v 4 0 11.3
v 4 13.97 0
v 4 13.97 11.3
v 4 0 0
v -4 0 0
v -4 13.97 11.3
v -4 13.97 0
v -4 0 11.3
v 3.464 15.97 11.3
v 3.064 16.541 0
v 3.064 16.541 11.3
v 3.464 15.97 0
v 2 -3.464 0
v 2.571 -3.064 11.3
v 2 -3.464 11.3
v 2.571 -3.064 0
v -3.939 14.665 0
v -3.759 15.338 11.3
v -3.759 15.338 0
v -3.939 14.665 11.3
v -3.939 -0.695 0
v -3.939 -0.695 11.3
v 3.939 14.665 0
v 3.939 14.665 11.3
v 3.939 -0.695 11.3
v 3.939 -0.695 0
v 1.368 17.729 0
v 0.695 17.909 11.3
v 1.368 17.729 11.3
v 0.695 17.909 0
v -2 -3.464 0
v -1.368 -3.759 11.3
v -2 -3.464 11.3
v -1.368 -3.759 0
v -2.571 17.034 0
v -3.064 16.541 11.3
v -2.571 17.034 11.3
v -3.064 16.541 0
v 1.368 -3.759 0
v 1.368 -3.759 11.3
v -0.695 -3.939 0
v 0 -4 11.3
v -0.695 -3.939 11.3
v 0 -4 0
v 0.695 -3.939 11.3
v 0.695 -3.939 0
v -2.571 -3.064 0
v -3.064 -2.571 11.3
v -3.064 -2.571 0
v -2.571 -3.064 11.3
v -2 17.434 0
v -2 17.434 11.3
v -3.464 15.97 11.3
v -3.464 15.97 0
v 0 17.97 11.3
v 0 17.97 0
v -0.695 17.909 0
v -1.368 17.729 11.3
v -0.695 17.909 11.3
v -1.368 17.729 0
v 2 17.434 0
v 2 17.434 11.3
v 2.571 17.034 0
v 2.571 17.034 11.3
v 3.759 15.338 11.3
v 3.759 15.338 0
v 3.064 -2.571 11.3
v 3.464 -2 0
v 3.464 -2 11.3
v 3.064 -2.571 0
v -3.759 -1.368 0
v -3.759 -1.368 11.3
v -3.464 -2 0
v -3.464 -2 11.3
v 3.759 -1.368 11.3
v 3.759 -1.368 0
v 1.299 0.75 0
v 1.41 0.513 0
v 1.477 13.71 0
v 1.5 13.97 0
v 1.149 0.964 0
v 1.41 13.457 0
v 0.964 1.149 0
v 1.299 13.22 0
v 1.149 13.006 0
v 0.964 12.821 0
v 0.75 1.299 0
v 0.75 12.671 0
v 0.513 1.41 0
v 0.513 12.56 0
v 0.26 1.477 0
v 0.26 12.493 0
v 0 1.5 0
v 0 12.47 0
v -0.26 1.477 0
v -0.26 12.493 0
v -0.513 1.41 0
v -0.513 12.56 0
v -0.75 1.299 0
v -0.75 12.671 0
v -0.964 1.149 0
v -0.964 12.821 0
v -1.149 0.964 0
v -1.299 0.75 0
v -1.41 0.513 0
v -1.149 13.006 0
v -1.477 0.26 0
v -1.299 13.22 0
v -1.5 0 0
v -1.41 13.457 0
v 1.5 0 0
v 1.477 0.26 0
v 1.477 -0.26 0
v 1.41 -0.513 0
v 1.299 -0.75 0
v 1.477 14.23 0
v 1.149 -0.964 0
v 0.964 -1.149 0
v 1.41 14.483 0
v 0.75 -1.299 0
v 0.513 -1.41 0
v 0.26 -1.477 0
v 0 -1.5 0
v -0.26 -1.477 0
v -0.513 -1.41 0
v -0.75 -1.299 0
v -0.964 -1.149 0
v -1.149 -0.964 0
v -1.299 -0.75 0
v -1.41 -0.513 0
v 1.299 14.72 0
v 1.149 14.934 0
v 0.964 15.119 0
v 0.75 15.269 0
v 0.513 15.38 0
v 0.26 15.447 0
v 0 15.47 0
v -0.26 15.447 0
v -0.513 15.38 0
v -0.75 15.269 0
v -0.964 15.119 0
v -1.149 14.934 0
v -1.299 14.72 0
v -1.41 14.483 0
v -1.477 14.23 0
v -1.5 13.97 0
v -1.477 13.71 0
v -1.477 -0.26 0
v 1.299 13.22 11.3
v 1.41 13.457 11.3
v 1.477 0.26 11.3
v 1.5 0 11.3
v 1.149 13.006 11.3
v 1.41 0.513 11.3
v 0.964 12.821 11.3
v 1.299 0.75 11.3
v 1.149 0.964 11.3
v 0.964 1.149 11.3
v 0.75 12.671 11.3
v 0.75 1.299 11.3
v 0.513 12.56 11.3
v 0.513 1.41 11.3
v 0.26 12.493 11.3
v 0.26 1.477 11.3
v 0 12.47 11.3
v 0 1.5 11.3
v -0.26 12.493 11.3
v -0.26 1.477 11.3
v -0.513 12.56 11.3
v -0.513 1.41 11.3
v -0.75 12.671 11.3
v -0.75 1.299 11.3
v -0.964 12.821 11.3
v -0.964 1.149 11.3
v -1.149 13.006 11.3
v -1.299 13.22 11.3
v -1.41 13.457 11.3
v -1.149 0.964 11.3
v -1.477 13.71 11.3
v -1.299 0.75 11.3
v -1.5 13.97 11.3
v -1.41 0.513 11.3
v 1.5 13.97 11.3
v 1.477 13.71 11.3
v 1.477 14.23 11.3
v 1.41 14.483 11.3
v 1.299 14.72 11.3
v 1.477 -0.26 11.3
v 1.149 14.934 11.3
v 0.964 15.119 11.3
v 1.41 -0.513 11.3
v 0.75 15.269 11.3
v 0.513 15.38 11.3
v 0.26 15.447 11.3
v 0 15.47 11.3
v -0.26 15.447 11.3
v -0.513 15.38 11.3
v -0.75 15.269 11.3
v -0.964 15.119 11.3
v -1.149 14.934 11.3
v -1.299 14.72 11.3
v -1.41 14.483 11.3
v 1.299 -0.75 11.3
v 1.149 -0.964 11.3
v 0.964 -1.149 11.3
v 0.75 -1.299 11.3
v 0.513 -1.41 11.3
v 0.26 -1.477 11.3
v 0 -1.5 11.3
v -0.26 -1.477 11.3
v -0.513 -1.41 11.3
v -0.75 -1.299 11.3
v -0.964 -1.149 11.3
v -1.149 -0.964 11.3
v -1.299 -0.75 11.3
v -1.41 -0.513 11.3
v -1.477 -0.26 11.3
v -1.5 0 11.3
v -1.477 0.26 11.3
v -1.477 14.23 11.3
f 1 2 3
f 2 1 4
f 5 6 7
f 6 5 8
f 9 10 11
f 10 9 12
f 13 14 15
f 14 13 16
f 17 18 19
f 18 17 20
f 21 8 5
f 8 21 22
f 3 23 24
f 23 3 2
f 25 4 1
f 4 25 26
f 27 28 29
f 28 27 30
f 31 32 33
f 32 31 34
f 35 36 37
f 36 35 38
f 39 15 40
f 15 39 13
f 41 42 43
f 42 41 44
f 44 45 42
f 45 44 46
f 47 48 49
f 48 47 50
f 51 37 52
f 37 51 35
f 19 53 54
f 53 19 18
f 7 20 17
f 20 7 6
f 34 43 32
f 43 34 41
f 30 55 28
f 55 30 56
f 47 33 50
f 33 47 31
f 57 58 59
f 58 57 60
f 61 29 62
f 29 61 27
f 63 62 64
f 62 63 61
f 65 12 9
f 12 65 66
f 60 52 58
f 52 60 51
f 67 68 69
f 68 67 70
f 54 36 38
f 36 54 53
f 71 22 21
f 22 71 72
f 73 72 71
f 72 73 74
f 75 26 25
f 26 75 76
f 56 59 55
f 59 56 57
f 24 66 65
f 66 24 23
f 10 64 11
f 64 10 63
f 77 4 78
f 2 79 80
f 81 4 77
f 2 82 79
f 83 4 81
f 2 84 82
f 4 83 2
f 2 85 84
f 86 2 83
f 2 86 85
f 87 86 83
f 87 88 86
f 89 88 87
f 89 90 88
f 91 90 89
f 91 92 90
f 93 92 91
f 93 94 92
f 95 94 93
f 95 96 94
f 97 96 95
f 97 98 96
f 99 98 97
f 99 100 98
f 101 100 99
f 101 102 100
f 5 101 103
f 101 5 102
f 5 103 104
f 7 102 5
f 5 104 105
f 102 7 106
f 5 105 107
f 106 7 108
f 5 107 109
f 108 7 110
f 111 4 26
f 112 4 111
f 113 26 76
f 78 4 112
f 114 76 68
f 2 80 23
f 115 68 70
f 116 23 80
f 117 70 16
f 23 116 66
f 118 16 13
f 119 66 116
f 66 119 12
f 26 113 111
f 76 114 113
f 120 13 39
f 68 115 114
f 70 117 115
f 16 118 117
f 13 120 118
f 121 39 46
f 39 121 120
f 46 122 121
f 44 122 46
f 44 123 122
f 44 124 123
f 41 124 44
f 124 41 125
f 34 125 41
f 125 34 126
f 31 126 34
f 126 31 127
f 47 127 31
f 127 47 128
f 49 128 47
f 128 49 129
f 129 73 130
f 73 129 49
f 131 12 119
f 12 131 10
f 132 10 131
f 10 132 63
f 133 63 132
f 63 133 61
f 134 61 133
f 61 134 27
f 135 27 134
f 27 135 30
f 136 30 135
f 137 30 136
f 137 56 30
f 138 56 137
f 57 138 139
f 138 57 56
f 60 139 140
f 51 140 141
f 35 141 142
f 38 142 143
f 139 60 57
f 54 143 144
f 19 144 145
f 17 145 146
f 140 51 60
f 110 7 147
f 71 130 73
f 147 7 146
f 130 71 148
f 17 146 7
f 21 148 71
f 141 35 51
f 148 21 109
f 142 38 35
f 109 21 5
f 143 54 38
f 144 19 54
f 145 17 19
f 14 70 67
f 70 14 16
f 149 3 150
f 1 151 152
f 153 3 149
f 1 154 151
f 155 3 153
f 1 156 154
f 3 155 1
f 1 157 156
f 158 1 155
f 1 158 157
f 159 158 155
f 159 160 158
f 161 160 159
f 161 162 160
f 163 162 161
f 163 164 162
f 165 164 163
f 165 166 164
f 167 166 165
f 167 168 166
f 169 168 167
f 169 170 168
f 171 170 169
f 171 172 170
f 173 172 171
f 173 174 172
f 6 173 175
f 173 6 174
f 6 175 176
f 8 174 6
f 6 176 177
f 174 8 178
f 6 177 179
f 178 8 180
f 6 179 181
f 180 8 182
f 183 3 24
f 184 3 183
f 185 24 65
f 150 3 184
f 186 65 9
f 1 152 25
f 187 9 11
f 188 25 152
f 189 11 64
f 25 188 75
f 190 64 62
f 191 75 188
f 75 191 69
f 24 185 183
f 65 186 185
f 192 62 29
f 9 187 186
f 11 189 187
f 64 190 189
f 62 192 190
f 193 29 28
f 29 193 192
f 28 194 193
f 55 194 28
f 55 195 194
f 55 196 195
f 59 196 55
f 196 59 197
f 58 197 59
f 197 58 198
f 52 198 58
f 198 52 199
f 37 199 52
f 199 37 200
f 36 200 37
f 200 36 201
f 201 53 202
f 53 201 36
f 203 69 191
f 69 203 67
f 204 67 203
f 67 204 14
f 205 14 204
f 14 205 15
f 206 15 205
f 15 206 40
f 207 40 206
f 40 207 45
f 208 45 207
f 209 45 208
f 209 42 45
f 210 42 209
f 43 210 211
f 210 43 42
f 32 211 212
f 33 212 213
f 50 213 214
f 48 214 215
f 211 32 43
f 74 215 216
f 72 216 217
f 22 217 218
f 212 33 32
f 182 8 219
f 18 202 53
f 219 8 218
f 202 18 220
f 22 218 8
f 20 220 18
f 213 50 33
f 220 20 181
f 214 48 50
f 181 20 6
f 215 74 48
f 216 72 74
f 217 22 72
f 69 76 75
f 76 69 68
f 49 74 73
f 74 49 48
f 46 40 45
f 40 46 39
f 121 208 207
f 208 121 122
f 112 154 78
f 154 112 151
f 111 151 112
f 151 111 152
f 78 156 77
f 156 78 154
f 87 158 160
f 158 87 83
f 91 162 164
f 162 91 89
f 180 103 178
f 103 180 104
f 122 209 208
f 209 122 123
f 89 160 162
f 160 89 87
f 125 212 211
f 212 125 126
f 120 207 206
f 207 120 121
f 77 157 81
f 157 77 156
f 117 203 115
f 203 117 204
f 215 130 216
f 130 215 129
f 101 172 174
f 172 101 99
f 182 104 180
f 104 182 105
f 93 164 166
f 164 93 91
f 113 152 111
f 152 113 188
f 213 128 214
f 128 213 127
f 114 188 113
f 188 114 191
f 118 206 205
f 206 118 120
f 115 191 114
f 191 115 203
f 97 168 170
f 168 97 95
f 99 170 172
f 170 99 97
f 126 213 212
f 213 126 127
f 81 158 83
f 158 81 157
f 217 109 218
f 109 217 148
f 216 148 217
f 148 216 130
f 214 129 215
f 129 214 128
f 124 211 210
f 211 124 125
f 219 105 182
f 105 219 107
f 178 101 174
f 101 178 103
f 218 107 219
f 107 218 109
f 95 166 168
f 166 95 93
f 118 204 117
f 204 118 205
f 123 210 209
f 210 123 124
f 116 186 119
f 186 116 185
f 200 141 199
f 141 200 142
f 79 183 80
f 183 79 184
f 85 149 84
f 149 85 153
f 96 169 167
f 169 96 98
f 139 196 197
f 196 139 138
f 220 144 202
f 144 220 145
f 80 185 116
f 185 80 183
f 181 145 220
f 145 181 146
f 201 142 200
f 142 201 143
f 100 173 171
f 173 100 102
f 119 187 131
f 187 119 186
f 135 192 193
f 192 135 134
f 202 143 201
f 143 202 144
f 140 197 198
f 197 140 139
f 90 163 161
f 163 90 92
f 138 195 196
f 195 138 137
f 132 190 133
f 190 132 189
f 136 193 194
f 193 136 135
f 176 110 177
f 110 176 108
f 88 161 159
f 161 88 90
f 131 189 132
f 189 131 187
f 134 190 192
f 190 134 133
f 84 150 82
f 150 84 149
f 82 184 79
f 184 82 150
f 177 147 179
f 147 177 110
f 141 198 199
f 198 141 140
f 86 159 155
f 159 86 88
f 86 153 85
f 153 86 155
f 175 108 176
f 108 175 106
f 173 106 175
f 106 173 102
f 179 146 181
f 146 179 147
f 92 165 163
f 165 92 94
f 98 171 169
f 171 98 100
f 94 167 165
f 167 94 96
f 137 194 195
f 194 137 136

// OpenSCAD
// file: CKvarsProfile_36in_201906.scad
///////////////////  USER SETTINGS  ///////////////////

/////////////
//  USING THIS FILE:
//  choose desired settings below
//  rename and save this file into the "SCAD" folder
//  for example CKvarsProfile-Small2019.scad
//  then open the file named CKvars.scad in the "SCAD" folder
//  find the "include" commands at the begining of the file
//  change this information to the new file's name, then save
//  you can now open then render each part file with these settings
/////////////

//File Notes - Large201903
// attempting to get near 45" 1100mm fabric width/circumference
// 

/////////////
// DIMENSIONS

//number of "p2" needle guides around circle                    //Jan2019  //small
UPp2number=30;                //12                //36  ///36   //12       //8

//number of needles mounted on each "p2" part
UPp2needles=5;                //5                 //10  ///5    //5        //7

//number of "p3" parts around circle
UPp3number=10;                 //4                 //18  ///4    //4        //2

//number of "p4" parts around circle
UPp4number=10;                 //4                 //18  ///4    //4        //2

//distance from the inside face of one needle to the next
UPneedle2needle=9.7;     //default=14.35615  //try 8.414    //13.5334  //9.25

//mountain settings
UPpMgrooveturnR=14; //radius of upper curved path in groove //14  //10
UPpMgrooveturnR2=7; //radius of lower curved path in groove //7
UPpMp3X=2.5;        //length of lower plateu of groove  //2.5   //2
UPpMp7X=3;          //half of length of top plateu of groove //3  //2

UPnumberMountain=6;

/////////////
// MATERIALS

//thread diameter
UPthreadD=2.5;

//number of stepper motors driving the geared plate
UPc1steppersnumber=UPnumberMountain;  

//laser cut part thickness
UPupper_surfaceH=3.4;  //thickness of upper rotating plate  ///5  //6.35= 1/4"inch
UPbottom_surface_motor_gearsH=3.4;  //thickness of geared rotating plate
UPtable_surface=10;        //thickness of plate of main table
UPtable_support=12.7;       //thickness of support board below table surface

//width of wood used to support table around the edges
UPwoodbeamW=25.4;           //table leg wood beam width  1.0 inch
UPwoodbeamScrewOD=6.32;     // 1/4" screw hole into wood beam

//thread feeder option
UPTF=1;    //  0=none  1=angle iron  2=makerbeam10mm

//angle iron option dimensions
UPaaX=12.7;      //width            //12.7    =  1/2in          
UPaaT=1.5875;    //thickness        //1.5875  = 1/16in

///////////////////////////////////////////////
// file: CKvarsNeedle-KH260.scad
//NEEDLE for Brother KH260
//measurements by dorkmo

nX=1.4;    //typical thickness from side to side
nY=2.44;   //typical thickness from front to back
nA=157.9;  //total length of needle
nB=53;     //distance from bottom of needle to bottom of bent tab.
nC=4.82;   //thickness of bent tab. top to bottom.
nD=5.48;   //hook front to back
nE=4.10;   //from top of loop to bottom of hook
nF=22.0;   //from top of loop to bottom of flipper in down position
nG=1.10;   //minimum thickness of hook. front to back.
nH=17.03;  //max distance from front to back
nT=0;      //0=straight tail 1=bent tail aka folded back. Y of tail = C if T=1.
// main file
include <CKvars.scad>;

CKp8b(); //small bearing holder

p8BbaseL=(p5wingL-p5mounthole2back-p5mounthole2front)+(p8holeend2C*2);

module CKp8b(){
    translate([0,-(p8baseW/2),0]){
        difference(){
            
 //           cube([p8baseW,p8baseL,pPspace2]);

            hull(){
            translate([0,p8baseW/2,0])
            cylinder(d=p8baseW,h=p8H,$fn=36);

            translate([0,p8BbaseL-(p8baseW/2),0])
            cylinder(d=p8baseW,h=p8H,$fn=36);
                
            }

            translate([0,p8holeend2C,-0.1])
            cylinder(d=p8holeD,h=p8H+0.2,$fn=36);

            translate([0,p8BbaseL-p8holeend2C,-0.1])
            cylinder(d=p8holeD,h=p8H+0.2,$fn=36);
            
        } //end main difference
    } //end translate
} //end main module
